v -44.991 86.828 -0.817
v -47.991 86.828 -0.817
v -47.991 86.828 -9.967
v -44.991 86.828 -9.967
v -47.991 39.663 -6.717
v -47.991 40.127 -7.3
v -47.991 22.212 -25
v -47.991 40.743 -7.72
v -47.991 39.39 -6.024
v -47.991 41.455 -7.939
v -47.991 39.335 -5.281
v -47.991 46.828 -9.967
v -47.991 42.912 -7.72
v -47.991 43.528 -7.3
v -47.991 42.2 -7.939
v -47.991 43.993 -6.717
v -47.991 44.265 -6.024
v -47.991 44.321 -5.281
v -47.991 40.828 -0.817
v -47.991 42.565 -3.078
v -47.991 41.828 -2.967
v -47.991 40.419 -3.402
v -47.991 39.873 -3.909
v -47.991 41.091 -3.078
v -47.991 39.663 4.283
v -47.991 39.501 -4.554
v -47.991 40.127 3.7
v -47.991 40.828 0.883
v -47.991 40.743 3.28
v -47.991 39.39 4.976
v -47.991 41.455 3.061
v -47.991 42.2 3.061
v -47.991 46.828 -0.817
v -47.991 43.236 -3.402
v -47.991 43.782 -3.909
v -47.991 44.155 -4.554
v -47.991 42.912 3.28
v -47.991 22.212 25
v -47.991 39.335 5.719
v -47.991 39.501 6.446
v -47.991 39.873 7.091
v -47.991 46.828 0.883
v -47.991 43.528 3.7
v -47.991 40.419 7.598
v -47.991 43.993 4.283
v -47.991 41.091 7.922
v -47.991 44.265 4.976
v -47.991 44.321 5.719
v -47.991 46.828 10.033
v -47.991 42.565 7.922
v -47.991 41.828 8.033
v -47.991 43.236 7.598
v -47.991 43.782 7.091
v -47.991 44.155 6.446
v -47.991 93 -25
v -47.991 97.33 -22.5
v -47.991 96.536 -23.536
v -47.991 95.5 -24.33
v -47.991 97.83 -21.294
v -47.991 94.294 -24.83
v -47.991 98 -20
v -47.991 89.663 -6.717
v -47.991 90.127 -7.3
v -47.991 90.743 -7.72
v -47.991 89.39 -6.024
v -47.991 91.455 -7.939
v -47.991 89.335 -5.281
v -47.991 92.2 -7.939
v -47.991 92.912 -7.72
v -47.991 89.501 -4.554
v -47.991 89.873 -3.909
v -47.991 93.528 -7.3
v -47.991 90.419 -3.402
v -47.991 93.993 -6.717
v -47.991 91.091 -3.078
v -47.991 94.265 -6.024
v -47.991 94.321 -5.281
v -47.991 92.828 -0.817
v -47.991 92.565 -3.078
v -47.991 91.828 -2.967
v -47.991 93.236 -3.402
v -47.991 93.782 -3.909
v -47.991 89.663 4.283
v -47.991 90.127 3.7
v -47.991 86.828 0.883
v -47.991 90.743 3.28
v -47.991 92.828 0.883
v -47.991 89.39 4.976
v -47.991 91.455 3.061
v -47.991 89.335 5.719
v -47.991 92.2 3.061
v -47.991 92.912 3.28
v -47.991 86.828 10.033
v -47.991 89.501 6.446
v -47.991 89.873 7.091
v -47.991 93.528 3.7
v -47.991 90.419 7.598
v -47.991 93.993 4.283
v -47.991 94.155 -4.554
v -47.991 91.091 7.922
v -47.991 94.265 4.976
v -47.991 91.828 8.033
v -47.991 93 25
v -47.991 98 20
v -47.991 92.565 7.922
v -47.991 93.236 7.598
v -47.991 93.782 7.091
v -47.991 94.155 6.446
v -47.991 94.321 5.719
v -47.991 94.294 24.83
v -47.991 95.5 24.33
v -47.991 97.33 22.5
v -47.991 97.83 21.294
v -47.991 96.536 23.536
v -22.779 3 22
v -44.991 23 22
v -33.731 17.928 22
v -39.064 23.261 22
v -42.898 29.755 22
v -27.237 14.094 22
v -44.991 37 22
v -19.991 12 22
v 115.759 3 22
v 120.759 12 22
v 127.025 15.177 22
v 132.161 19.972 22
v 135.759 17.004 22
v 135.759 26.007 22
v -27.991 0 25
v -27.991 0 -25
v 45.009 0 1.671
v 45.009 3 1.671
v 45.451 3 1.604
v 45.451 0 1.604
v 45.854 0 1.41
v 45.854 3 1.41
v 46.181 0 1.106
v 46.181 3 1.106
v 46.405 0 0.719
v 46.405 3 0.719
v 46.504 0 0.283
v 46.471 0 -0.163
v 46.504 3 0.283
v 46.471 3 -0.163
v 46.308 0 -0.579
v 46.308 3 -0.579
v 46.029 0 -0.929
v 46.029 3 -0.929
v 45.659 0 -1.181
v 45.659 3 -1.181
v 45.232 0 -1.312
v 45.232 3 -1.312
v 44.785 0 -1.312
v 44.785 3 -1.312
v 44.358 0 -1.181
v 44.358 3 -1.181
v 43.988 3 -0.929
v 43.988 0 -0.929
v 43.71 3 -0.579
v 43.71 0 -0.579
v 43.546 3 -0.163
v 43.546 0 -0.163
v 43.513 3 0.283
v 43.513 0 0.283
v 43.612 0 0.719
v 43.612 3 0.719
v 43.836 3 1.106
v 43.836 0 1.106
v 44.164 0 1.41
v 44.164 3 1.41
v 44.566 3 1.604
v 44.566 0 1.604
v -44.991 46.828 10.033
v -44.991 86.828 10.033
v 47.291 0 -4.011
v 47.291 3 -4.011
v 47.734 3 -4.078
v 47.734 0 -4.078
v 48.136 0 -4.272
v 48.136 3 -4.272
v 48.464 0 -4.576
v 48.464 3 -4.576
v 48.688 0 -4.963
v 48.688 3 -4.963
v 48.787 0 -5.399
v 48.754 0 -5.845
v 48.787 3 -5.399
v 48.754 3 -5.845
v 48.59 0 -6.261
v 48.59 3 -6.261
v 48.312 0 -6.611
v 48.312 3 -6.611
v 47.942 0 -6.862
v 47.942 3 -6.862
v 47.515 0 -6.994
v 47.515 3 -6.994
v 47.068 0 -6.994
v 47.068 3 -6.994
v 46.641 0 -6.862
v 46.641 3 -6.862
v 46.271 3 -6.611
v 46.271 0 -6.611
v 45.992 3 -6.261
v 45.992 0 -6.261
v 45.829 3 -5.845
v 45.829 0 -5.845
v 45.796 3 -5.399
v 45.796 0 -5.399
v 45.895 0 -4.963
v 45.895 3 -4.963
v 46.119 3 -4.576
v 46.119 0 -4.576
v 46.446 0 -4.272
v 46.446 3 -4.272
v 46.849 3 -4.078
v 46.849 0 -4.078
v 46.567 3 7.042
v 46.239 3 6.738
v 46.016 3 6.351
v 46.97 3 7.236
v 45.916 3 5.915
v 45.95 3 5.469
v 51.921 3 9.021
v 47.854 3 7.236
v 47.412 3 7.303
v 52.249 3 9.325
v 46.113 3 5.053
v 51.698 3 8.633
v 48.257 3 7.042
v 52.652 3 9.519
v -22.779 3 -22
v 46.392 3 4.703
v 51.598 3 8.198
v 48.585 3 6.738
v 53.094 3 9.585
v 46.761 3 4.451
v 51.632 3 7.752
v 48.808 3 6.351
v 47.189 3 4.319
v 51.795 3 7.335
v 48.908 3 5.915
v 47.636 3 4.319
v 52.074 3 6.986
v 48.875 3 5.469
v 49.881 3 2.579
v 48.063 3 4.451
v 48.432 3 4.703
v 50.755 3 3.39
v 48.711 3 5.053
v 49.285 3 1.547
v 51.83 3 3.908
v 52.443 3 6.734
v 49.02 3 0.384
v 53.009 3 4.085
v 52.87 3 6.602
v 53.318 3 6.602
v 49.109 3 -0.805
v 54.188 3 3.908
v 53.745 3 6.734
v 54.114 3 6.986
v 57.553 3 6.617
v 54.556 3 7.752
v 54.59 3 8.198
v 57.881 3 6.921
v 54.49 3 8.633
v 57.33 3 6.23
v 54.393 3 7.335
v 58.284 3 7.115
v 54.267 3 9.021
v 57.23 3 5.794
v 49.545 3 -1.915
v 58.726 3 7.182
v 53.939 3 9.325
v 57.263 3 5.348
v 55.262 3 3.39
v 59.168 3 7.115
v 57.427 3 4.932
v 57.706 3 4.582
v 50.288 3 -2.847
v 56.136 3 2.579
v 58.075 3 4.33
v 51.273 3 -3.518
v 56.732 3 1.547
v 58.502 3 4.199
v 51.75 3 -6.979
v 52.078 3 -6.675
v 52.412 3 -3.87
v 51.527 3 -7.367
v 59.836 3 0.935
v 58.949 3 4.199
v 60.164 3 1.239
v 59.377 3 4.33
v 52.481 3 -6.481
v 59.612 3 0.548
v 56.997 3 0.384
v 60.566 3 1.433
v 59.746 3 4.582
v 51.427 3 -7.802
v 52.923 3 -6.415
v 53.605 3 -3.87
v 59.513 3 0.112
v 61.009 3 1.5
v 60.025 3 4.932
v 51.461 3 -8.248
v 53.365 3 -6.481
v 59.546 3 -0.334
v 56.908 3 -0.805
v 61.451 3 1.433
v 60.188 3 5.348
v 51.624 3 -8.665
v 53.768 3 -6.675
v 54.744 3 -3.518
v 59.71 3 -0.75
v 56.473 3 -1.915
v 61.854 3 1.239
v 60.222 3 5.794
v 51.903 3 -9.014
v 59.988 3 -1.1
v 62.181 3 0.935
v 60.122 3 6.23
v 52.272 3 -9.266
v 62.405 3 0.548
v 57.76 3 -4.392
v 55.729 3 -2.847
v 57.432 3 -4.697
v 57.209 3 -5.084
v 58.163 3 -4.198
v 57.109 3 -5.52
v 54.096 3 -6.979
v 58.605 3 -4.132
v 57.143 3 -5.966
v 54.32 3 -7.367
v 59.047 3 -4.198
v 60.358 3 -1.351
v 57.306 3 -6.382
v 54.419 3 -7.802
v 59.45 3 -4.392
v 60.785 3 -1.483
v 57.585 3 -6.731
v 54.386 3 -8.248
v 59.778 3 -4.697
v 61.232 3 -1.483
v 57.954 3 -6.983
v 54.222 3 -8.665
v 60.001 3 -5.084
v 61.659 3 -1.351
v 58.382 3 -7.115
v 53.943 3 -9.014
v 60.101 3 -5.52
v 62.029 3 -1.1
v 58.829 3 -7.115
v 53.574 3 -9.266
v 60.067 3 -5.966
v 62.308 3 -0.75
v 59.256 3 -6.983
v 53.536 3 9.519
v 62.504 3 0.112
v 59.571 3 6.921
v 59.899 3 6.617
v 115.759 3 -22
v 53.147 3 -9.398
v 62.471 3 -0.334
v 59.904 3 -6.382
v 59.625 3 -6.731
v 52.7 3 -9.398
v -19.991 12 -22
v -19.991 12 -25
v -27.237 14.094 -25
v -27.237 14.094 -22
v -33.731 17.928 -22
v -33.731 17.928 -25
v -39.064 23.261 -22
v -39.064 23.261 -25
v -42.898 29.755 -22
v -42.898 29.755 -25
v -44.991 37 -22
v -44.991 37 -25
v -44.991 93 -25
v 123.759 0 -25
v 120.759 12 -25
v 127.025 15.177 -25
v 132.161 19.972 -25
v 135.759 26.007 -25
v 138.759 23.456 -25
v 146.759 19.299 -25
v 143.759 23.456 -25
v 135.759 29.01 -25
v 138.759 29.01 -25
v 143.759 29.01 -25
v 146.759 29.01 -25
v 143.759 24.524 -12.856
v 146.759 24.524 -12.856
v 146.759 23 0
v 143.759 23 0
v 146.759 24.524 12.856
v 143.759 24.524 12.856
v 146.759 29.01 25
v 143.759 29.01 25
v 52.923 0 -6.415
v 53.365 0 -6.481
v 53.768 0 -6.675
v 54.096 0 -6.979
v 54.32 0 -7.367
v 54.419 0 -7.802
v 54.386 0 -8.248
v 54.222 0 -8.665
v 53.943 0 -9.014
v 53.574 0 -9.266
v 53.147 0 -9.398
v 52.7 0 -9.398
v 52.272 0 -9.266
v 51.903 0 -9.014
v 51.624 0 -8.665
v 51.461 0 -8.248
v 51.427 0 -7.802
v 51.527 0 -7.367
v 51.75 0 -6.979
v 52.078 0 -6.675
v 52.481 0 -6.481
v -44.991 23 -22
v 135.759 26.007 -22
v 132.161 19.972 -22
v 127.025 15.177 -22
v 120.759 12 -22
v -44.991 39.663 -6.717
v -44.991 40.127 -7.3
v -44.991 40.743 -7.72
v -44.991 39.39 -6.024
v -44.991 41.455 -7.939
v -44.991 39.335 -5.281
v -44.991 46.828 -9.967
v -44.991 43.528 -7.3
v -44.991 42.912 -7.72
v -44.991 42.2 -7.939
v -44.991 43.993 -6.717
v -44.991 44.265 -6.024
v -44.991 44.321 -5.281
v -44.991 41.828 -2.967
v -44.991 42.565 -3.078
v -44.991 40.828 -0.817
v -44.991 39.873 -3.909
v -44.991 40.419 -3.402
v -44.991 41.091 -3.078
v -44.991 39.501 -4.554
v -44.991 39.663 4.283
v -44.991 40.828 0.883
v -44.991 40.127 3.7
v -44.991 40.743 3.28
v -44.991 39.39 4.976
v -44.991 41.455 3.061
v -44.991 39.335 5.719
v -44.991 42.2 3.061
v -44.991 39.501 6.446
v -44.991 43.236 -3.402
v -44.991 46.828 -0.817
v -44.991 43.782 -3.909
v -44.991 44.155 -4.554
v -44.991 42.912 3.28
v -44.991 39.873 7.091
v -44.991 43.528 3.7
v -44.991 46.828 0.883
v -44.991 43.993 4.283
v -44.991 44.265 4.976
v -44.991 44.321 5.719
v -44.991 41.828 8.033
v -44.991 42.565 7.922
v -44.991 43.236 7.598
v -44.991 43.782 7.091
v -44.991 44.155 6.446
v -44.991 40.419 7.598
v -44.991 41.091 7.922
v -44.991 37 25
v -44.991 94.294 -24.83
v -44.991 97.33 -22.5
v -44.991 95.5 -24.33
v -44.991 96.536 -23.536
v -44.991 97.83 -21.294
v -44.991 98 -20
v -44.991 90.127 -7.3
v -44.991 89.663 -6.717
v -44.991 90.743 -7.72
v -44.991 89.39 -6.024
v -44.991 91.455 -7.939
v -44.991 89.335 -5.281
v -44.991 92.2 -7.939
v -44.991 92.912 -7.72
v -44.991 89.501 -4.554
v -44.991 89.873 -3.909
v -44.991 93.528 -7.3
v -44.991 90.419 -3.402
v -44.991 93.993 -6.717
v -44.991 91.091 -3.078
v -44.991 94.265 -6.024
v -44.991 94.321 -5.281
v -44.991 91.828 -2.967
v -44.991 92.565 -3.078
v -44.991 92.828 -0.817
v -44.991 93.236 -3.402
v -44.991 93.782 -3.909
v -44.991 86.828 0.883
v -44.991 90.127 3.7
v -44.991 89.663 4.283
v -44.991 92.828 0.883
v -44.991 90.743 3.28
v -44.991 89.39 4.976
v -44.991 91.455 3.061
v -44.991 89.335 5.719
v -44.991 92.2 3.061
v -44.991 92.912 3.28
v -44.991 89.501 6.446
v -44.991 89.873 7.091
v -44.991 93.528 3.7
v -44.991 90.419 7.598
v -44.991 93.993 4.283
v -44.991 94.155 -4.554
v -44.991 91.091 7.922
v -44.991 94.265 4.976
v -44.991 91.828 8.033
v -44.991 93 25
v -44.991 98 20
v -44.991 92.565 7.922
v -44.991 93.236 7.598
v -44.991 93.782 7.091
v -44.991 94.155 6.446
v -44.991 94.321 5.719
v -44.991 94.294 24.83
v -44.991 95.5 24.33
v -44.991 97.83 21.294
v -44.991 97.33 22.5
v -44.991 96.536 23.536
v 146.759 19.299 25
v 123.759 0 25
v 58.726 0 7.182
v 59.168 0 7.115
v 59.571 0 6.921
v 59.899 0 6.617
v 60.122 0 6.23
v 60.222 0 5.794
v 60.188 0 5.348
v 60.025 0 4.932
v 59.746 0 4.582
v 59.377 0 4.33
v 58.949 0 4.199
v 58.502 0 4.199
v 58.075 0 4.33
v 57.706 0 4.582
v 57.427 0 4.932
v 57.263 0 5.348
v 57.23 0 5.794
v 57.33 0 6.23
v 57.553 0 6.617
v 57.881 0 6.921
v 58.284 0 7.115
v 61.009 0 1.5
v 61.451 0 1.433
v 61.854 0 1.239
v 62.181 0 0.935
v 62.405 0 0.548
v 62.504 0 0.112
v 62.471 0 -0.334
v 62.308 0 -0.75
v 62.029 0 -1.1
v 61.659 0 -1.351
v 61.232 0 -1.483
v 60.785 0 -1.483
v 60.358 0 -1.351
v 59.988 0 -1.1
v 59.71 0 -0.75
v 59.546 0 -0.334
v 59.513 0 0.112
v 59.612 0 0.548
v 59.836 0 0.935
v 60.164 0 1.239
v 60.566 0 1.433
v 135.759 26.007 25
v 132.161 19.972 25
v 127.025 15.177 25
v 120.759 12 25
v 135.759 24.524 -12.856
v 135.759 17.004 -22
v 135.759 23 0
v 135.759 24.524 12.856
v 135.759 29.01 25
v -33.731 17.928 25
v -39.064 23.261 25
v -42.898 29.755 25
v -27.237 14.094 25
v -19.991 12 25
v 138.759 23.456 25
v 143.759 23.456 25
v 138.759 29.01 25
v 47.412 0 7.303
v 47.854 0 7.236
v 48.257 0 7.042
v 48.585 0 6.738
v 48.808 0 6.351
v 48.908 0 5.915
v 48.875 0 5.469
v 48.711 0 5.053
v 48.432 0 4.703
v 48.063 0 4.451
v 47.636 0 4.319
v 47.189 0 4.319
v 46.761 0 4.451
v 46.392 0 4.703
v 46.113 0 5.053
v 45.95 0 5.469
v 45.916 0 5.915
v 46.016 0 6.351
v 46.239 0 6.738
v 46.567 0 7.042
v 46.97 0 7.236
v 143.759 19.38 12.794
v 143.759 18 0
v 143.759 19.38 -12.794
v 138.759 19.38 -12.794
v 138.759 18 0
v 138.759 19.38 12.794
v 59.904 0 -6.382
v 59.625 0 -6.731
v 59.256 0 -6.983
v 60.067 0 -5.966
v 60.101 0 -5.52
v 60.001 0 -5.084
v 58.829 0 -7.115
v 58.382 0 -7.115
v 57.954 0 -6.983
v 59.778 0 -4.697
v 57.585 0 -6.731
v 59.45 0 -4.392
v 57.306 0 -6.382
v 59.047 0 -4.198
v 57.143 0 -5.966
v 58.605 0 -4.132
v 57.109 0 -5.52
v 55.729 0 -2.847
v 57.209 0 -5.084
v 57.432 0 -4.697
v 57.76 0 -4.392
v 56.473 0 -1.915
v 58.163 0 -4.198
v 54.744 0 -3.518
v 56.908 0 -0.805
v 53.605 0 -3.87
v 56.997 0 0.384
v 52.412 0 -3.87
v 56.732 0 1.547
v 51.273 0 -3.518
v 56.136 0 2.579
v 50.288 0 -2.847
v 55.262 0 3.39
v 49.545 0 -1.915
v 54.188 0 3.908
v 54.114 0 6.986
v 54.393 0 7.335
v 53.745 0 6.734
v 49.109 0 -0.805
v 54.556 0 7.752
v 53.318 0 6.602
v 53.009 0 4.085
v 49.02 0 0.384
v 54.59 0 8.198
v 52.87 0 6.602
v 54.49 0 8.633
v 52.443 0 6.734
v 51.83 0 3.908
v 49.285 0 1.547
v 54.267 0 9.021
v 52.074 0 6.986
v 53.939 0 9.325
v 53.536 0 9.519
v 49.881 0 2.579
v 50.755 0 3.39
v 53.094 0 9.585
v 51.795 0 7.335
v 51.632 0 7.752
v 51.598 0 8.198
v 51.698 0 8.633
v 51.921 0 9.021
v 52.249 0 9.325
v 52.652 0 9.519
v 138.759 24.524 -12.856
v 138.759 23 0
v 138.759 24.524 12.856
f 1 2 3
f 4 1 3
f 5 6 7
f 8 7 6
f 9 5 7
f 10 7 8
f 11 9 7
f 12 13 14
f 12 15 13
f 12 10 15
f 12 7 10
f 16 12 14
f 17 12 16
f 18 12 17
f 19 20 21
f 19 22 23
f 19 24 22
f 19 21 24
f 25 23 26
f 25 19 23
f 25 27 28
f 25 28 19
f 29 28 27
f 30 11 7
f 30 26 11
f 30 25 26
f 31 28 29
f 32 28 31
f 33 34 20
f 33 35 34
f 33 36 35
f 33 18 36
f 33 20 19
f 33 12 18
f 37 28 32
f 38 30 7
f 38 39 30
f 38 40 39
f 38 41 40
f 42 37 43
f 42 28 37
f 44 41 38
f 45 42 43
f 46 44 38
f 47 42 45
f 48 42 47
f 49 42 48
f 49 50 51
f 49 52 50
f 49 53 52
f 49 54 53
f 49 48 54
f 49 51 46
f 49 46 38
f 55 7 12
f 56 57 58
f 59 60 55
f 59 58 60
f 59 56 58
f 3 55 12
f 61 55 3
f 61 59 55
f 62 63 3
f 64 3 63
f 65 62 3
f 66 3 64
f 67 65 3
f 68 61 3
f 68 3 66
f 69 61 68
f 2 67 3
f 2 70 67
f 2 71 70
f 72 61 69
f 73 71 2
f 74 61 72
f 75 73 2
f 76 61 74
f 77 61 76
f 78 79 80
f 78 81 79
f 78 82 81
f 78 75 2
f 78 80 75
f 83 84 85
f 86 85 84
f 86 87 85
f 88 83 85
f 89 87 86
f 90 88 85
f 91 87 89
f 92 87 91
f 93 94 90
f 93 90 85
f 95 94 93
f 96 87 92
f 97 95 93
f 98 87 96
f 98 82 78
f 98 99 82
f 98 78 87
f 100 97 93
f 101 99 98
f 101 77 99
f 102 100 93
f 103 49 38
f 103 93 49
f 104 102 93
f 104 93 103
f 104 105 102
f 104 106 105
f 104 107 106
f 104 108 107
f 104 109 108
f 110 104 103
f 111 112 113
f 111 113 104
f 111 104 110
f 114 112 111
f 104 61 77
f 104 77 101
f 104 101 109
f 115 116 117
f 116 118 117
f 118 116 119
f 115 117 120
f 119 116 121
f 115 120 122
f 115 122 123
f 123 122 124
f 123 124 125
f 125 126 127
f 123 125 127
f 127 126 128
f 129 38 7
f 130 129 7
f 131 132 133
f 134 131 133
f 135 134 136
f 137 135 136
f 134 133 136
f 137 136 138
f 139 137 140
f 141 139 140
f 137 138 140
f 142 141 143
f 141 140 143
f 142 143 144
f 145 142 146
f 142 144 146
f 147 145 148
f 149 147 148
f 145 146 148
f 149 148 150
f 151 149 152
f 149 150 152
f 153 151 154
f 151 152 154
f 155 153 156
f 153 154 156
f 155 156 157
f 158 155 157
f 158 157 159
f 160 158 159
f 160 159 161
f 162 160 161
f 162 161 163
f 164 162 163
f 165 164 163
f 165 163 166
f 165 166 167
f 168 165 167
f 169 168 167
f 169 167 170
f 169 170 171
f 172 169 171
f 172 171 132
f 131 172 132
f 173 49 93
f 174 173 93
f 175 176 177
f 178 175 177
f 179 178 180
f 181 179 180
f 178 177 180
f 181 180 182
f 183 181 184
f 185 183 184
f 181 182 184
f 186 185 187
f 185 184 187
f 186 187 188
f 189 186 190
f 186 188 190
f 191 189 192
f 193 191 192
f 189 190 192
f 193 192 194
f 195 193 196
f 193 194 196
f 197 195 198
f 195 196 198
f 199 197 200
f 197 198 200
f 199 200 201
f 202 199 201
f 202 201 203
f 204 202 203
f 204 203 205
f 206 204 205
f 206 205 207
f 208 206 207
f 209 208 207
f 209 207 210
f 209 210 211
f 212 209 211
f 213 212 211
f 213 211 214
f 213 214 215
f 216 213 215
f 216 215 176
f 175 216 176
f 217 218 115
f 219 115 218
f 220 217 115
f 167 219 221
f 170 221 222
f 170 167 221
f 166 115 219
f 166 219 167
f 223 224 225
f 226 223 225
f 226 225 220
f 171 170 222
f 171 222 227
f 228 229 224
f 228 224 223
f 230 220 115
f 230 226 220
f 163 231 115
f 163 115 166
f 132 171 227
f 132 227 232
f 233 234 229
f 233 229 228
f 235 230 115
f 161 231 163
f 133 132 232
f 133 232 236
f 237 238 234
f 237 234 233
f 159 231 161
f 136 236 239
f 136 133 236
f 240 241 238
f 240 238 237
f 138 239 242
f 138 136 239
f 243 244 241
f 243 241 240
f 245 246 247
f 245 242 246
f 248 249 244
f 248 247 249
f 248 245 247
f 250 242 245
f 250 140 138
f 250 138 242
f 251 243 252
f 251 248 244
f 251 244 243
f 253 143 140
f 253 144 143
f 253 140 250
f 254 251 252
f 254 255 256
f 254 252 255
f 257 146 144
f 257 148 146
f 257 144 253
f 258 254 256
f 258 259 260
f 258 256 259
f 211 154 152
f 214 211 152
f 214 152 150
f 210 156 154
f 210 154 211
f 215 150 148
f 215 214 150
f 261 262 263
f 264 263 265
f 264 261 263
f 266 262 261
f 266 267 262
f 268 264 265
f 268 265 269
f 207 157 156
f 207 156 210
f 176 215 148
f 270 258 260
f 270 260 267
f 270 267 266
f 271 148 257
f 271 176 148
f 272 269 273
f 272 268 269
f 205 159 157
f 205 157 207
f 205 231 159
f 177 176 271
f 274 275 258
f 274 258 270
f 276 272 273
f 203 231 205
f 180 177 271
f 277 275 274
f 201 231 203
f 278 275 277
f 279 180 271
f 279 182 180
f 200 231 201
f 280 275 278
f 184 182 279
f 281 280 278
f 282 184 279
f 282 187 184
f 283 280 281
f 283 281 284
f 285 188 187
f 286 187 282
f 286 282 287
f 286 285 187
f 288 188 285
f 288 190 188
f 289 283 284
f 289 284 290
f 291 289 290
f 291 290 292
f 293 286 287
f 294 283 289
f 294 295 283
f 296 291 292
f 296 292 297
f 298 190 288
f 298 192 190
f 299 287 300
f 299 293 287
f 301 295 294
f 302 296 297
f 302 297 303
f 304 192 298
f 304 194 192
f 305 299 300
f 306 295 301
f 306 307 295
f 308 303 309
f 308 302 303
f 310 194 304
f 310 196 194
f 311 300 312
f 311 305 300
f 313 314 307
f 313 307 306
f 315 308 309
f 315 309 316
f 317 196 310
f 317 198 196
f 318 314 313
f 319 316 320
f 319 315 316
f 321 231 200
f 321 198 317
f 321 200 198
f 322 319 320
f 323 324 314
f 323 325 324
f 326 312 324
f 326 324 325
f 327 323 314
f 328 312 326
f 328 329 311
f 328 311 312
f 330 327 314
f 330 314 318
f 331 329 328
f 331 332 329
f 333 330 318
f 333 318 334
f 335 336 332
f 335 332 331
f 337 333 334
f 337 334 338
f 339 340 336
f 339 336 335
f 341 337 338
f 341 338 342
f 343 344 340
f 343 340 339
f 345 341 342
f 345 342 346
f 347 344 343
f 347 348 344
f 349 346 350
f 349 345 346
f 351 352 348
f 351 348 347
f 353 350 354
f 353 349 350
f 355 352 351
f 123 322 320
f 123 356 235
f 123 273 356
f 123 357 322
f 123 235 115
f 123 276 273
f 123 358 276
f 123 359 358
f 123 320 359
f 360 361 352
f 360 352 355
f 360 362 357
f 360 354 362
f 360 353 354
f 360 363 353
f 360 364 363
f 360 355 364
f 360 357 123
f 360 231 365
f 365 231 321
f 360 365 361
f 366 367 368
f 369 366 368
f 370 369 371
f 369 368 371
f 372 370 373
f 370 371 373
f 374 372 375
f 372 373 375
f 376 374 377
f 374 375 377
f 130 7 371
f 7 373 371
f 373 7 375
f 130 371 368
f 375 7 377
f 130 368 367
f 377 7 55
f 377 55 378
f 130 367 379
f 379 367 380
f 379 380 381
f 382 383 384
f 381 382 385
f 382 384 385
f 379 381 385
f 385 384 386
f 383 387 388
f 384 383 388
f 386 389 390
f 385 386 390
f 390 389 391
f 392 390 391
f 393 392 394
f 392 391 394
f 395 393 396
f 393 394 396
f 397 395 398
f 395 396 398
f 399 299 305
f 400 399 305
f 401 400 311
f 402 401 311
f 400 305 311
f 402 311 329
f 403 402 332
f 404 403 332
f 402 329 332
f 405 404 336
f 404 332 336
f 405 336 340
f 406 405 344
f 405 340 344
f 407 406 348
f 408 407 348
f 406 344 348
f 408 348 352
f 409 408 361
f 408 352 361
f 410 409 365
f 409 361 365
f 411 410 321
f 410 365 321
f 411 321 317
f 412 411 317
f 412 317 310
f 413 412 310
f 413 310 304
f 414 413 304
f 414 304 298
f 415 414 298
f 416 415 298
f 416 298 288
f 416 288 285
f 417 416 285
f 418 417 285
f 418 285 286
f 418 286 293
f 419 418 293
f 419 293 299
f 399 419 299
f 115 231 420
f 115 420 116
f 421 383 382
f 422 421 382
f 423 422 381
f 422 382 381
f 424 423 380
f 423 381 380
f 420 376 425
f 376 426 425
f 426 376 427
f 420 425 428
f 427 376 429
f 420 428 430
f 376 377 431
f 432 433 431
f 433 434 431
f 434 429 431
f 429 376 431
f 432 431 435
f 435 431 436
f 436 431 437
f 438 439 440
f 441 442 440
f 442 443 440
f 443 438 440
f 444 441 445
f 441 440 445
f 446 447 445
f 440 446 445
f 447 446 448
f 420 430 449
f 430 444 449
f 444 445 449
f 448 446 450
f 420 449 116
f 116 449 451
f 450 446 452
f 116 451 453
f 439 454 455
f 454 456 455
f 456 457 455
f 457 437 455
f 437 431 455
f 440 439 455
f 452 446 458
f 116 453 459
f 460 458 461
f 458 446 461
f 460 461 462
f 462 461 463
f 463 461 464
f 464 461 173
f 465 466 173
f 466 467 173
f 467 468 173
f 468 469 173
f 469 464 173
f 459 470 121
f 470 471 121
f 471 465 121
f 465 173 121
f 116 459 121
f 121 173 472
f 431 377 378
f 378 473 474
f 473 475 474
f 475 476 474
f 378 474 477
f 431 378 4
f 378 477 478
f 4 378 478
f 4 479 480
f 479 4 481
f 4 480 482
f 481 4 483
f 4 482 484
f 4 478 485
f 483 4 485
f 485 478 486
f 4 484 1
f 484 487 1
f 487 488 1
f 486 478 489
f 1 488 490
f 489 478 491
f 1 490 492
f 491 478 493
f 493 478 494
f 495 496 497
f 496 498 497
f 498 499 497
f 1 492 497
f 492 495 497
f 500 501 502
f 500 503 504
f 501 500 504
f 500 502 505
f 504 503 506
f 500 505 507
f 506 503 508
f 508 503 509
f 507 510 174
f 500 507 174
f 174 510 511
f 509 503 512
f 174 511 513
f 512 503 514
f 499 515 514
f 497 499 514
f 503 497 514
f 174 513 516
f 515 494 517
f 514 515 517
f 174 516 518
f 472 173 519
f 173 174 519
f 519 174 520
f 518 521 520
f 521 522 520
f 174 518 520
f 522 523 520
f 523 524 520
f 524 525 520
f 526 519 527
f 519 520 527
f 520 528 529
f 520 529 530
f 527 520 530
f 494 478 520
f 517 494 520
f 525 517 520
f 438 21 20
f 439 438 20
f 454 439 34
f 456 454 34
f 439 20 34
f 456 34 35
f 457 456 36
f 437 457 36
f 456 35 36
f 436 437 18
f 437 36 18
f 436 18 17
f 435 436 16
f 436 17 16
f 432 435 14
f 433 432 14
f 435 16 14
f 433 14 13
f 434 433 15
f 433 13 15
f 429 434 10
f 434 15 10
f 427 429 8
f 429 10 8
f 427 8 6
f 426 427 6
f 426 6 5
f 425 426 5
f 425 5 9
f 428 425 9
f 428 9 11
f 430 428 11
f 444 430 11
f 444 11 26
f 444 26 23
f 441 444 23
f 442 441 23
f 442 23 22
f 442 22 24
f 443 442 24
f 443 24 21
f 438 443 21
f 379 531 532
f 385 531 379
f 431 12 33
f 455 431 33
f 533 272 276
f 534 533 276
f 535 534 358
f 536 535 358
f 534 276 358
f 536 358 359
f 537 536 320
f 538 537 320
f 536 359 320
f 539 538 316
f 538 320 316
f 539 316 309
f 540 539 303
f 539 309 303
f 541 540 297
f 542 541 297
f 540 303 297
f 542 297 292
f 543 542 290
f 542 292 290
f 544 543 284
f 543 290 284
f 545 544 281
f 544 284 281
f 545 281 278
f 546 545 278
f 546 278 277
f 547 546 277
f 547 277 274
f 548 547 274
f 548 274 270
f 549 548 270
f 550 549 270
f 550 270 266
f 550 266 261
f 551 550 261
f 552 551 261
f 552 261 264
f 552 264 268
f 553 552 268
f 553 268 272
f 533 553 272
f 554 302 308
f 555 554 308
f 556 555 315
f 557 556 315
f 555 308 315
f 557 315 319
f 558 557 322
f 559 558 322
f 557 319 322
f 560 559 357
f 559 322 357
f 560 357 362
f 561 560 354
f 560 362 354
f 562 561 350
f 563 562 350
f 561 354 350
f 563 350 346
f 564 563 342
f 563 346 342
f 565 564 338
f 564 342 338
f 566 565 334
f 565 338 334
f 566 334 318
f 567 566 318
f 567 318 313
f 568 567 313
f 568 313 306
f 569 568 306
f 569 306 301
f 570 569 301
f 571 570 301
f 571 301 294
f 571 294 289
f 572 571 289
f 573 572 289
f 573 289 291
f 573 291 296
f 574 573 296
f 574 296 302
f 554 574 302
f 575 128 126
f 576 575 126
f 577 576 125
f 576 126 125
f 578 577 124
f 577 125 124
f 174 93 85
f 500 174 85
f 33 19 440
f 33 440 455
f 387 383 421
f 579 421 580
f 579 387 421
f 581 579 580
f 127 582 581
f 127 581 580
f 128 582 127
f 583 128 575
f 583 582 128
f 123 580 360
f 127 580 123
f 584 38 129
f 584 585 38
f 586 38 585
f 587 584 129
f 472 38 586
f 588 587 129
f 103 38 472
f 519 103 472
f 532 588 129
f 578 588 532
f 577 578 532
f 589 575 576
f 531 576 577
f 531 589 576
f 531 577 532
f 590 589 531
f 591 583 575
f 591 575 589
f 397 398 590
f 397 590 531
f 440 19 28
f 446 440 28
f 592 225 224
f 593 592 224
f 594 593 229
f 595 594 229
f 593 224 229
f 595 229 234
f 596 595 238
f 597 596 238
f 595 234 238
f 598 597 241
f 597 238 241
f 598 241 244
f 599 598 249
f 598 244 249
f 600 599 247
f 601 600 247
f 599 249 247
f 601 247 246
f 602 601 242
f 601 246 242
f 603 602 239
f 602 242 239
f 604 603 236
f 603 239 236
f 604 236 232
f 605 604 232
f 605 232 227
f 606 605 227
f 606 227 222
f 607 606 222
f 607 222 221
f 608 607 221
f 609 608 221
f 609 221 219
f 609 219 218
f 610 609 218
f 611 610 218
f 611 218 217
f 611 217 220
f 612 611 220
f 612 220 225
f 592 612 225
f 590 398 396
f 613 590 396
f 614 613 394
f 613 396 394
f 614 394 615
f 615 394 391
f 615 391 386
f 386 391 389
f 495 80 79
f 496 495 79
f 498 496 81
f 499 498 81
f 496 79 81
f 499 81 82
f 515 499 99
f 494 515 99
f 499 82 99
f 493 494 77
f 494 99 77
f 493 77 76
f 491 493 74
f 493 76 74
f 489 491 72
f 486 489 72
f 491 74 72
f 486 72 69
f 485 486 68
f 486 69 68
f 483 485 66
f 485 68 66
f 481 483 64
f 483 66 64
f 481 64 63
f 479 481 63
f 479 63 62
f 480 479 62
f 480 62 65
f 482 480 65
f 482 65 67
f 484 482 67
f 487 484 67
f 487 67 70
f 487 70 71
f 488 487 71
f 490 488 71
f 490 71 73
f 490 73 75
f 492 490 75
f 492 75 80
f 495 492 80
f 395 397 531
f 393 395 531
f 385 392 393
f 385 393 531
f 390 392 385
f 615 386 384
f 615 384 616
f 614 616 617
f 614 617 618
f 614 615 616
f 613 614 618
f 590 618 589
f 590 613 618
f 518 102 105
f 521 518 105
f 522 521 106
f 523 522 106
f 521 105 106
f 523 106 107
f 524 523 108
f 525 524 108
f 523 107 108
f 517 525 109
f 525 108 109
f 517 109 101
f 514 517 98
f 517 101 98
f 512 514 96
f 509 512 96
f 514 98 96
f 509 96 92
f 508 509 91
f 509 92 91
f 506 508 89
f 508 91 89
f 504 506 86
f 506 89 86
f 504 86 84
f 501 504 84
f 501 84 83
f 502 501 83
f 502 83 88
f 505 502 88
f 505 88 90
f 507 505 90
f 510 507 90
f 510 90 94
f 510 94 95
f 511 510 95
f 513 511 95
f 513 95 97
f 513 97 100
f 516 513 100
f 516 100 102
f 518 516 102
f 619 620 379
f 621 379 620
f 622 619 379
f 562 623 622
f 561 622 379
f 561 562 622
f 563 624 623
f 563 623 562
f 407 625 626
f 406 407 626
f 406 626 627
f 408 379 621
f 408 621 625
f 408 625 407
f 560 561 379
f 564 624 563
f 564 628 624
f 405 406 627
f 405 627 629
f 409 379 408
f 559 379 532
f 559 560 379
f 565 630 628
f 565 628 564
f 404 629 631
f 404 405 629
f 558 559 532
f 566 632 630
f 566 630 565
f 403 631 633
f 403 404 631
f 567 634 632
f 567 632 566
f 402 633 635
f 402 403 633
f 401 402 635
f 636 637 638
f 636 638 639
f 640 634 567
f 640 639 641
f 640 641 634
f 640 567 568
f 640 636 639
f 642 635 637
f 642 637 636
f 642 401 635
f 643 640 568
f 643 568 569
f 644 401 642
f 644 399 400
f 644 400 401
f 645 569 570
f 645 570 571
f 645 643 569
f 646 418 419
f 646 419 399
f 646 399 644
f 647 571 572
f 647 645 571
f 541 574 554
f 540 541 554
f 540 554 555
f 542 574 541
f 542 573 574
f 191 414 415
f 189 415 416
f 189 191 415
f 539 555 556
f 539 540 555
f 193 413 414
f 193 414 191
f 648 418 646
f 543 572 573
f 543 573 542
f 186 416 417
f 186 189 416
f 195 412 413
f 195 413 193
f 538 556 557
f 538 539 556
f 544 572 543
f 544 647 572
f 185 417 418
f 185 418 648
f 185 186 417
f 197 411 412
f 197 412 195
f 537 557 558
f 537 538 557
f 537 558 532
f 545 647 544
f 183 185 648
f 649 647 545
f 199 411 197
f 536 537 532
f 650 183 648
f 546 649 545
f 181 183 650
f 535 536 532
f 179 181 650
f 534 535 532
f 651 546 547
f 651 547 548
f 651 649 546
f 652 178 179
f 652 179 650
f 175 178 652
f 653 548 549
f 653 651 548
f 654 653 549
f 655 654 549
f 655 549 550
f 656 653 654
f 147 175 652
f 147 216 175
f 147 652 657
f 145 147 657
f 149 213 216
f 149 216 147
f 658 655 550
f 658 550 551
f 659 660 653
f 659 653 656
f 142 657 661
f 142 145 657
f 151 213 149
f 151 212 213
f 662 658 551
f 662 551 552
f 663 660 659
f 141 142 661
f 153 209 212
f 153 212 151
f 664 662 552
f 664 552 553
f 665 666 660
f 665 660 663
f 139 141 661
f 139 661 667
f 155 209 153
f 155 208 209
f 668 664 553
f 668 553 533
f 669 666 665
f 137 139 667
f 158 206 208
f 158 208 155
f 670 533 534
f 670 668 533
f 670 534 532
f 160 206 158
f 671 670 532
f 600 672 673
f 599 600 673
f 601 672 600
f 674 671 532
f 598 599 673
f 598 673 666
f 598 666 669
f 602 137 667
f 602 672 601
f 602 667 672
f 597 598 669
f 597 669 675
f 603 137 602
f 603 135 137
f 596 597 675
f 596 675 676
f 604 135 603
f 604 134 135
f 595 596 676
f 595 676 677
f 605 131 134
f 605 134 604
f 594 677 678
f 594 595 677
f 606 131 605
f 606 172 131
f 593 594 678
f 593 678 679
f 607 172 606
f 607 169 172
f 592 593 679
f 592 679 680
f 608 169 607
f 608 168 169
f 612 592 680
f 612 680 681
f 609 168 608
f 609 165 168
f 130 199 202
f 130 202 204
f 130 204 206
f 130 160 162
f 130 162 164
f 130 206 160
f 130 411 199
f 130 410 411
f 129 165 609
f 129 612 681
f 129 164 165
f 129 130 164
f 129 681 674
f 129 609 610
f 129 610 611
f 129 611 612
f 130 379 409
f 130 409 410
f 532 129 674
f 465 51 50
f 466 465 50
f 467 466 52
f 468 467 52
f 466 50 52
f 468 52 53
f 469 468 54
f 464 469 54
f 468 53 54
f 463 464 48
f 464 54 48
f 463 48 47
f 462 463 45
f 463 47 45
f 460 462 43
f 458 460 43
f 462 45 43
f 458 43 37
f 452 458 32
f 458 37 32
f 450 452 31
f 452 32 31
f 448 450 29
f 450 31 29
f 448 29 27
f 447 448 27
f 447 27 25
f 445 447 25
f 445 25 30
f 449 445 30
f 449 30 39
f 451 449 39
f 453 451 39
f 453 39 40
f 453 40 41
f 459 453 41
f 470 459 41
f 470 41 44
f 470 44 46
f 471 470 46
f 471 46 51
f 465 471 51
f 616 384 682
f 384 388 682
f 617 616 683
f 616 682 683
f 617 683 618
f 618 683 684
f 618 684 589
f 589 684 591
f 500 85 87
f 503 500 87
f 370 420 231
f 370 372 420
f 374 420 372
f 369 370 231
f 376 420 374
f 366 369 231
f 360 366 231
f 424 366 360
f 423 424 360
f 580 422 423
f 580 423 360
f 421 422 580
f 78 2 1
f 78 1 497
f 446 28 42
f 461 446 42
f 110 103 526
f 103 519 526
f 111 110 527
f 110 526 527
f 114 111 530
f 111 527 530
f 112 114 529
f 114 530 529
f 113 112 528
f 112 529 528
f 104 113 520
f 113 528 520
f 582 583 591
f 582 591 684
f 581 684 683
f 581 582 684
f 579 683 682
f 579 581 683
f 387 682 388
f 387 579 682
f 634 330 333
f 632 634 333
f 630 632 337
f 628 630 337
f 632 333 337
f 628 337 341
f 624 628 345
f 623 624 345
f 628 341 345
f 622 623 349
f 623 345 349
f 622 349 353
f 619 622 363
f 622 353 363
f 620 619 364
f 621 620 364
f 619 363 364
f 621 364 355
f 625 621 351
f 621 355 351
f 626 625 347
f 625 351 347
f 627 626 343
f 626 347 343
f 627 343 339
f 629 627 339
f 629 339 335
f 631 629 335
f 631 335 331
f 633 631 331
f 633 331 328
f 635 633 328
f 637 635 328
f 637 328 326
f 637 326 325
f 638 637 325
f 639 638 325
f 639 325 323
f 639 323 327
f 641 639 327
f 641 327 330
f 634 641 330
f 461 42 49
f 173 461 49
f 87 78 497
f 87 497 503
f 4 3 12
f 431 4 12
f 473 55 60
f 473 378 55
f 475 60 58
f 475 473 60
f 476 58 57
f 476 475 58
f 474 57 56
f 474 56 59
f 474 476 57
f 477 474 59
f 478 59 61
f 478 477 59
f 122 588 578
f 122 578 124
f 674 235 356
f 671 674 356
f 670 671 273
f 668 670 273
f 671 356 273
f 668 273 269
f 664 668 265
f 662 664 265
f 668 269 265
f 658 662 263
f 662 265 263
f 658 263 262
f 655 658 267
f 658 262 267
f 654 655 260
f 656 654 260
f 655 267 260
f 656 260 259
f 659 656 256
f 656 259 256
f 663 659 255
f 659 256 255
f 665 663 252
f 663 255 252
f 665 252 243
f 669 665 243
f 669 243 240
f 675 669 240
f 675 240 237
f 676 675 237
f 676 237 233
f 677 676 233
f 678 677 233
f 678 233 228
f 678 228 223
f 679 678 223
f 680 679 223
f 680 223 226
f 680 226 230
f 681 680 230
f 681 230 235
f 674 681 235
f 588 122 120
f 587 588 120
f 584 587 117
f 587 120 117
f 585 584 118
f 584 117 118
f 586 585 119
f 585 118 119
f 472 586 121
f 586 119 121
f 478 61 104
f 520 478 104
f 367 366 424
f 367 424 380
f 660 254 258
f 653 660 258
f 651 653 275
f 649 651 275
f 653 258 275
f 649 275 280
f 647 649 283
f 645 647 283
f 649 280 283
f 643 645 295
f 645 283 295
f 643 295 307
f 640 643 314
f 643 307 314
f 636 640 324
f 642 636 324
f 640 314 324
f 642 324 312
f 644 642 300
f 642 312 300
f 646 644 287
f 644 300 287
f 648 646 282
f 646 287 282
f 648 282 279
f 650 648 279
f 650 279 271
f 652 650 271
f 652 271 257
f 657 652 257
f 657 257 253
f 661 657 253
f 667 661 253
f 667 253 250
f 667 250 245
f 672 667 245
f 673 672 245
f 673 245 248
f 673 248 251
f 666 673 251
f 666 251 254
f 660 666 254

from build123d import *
from OCP.BRepFilletAPI import BRepFilletAPI_MakeChamfer

# Parameters (mm, degrees)
SKETCH1_W           = 194.75
SKETCH1_H           = 50
BOSS_EXTRUDE1_DEPTH = 3
BOSS_EXTRUDE2_START = -3
BOSS_EXTRUDE2_DEPTH = 5
BOSS_EXTRUDE3_DEPTH = 3
BOSS_EXTRUDE4_START = -3
BOSS_EXTRUDE4_DEPTH = 3
SKETCH6_W           = 50
SKETCH6_H           = 95
BOSS_EXTRUDE5_DEPTH = 3
BOSS_EXTRUDE6_REACH = 218.788
SKETCH7_W           = 3
SKETCH7_H           = 9
RIB1_START          = -3
RIB1_DEPTH          = 3
LPATTERN1_COUNT     = 2
LPATTERN1_PITCH     = 47
RIB2_START          = -3
RIB2_DEPTH          = 3
LPATTERN2_COUNT     = 2
LPATTERN2_PITCH     = 47
CUT_EXTRUDE1_REACH  = 178.602
SKETCH10_R          = 4
SKETCH10_R_2        = 1.5
FILLET1_R           = 5
CHAMFER1_SIZE       = 20
CHAMFER1_SIZE2      = 22.212250297
CHAMFER2_SIZE       = 20
CHAMFER2_SIZE2      = 14.004150764
CHAMFER3_SIZE       = 23
CHAMFER3_SIZE2      = 19.299291517
CUT_EXTRUDE2_REACH  = 221.446
SKETCH11_W          = 1.7
SKETCH11_H          = 6
SKETCH11_R          = 2.5


# Read off the part's stored shape, not the designer's step: Rib1, Rib2
with BuildPart() as part:
    # Sketch1 → Boss-Extrude1 (new body)
    with BuildSketch(Plane(origin=(0, 0, 0), x_dir=(1, 0, 0), z_dir=(0, 1, 0))):
        with Locations((49.3836315, 0)):
            Rectangle(SKETCH1_W, SKETCH1_H)
    extrude(amount=BOSS_EXTRUDE1_DEPTH)

    # Sketch2 → Boss-Extrude2 (add)
    with BuildSketch(Plane(origin=(146.7586315, 0, 0), x_dir=(0, 0, -1), z_dir=(1, 0, 0)).offset(BOSS_EXTRUDE2_START)):
        with BuildLine():
            Line((25, 3), (25, 23.456439427))
            ThreePointArc((25, 23.456439427), (0, 18), (-25, 23.456439427))
            Line((-25, 23.456439427), (-25, 3))
            Line((-25, 3), (25, 3))
        make_face()
    extrude(amount=-BOSS_EXTRUDE2_DEPTH)

    # Sketch3 → Boss-Extrude3 (add)
    with BuildSketch(Plane(origin=(143.7586315, 0, 0), x_dir=(0, 0, -1), z_dir=(1, 0, 0))):
        with BuildLine():
            Line((-25, 3), (25, 3))
            Line((25, 3), (25, 29.010205144))
            ThreePointArc((25, 29.010205144), (0, 23), (-25, 29.010205144))
            Line((-25, 29.010205144), (-25, 3))
        make_face()
    extrude(amount=BOSS_EXTRUDE3_DEPTH)

    # Sketch4 → Boss-Extrude4 (add)
    with BuildSketch(Plane(origin=(138.7586315, 0, 0), x_dir=(0, 0, -1), z_dir=(1, 0, 0)).offset(BOSS_EXTRUDE4_START)):
        with BuildLine():
            Line((-25, 0), (-25, 29.010205144))
            ThreePointArc((-25, 29.010205144), (0, 23), (25, 29.010205144))
            Line((25, 29.010205144), (25, 0))
            Line((25, 0), (-25, 0))
        make_face()
    extrude(amount=BOSS_EXTRUDE4_DEPTH)

    # Sketch6 → Boss-Extrude5 (add)
    with BuildSketch(Plane.ZY.offset(47.9913685)):
        with Locations((0, 50.5)):
            Rectangle(SKETCH6_W, SKETCH6_H)
    extrude(amount=-BOSS_EXTRUDE5_DEPTH)

    # Sketch7 → Boss-Extrude6 (add, up to next)
    with BuildSketch(Plane(origin=(-44.9913685, 0, 0), x_dir=(0, 0, -1), z_dir=(1, 0, 0)), mode=Mode.PRIVATE) as boss_extrude6_sk1:
        with Locations((-23.5, 7.5)):
            Rectangle(SKETCH7_W, SKETCH7_H)
    boss_extrude6_tool1 = extrude(boss_extrude6_sk1.sketch, amount=BOSS_EXTRUDE6_REACH, mode=Mode.PRIVATE) - part.part
    # Sketch7 → Boss-Extrude6 (add, up to next)
    with BuildSketch(Plane(origin=(-44.9913685, 0, 0), x_dir=(0, 0, -1), z_dir=(1, 0, 0)), mode=Mode.PRIVATE) as boss_extrude6_sk2:
        with Locations((23.5, 7.5)):
            Rectangle(SKETCH7_W, SKETCH7_H)
    boss_extrude6_tool2 = extrude(boss_extrude6_sk2.sketch, amount=BOSS_EXTRUDE6_REACH, mode=Mode.PRIVATE) - part.part
    add(boss_extrude6_tool1.solids().sort_by_distance((-44.991369, 7.5, 23.5))[0])
    add(boss_extrude6_tool2.solids().sort_by_distance((-44.991369, 7.5, -23.5))[0])

    # Rib1 outline → Rib1 (add)
    with BuildSketch(Plane.XY.offset(25).offset(RIB1_START)):
        with BuildLine():
            ThreePointArc((-19.991368497, 11.999999999), (-36.565435434, 20.425933064), (-44.9913685, 37))
            Line((-44.9913685, 37), (-44.9913685, 12))
            Line((-44.9913685, 12), (-19.991368497, 11.999999999))
        make_face()
    rib1 = extrude(amount=RIB1_DEPTH)

    # LPattern1: Rib1 ×2
    with Locations(*[(0, 0, -i * LPATTERN1_PITCH) for i in range(1, LPATTERN1_COUNT)]):
        add(rib1)

    # Rib2 outline → Rib2 (add)
    with BuildSketch(Plane.XY.offset(25).offset(RIB2_START)):
        with BuildLine():
            ThreePointArc((135.7586315, 26.007069295), (129.762224626, 17.393355072), (120.7586315, 12))
            Line((120.7586315, 12), (135.7586315, 12))
            Line((135.7586315, 12), (135.7586315, 26.007069295))
        make_face()
    rib2 = extrude(amount=RIB2_DEPTH)

    # LPattern2: Rib2 ×2
    with Locations(*[(0, 0, -i * LPATTERN2_PITCH) for i in range(1, LPATTERN2_COUNT)]):
        add(rib2)

    # Sketch10 → Cut-Extrude1 (cut, up to next)
    with BuildSketch(Plane(origin=(0, 3, 0), x_dir=(1, 0, 0), z_dir=(0, 1, 0)), mode=Mode.PRIVATE) as cut_extrude1_sk1:
        with Locations(Location((53.0086315, -0.085435095, 0), (0, 0, 270))):
            Circle(SKETCH10_R)
    cut_extrude1_tool1 = extrude(cut_extrude1_sk1.sketch, amount=-CUT_EXTRUDE1_REACH, mode=Mode.PRIVATE) & part.part
    # Sketch10 → Cut-Extrude1 (cut, up to next)
    with BuildSketch(Plane(origin=(0, 3, 0), x_dir=(1, 0, 0), z_dir=(0, 1, 0)), mode=Mode.PRIVATE) as cut_extrude1_sk2:
        with Locations(Location((61.0086315, -2.1452e-05, 0), (0, 0, 270))):
            Circle(SKETCH10_R_2)
    cut_extrude1_tool2 = extrude(cut_extrude1_sk2.sketch, amount=-CUT_EXTRUDE1_REACH, mode=Mode.PRIVATE) & part.part
    # Sketch10 → Cut-Extrude1 (cut, up to next)
    with BuildSketch(Plane(origin=(0, 3, 0), x_dir=(1, 0, 0), z_dir=(0, 1, 0)), mode=Mode.PRIVATE) as cut_extrude1_sk3:
        with Locations(Location((58.725882315, -5.681892778, 0), (0, 0, 270))):
            Circle(SKETCH10_R_2)
    cut_extrude1_tool3 = extrude(cut_extrude1_sk3.sketch, amount=-CUT_EXTRUDE1_REACH, mode=Mode.PRIVATE) & part.part
    # Sketch10 → Cut-Extrude1 (cut, up to next)
    with BuildSketch(Plane(origin=(0, 3, 0), x_dir=(1, 0, 0), z_dir=(0, 1, 0)), mode=Mode.PRIVATE) as cut_extrude1_sk4:
        with Locations(Location((53.094045142, -8.085435095, 0), (0, 0, 270))):
            Circle(SKETCH10_R_2)
    cut_extrude1_tool4 = extrude(cut_extrude1_sk4.sketch, amount=-CUT_EXTRUDE1_REACH, mode=Mode.PRIVATE) & part.part
    # Sketch10 → Cut-Extrude1 (cut, up to next)
    with BuildSketch(Plane(origin=(0, 3, 0), x_dir=(1, 0, 0), z_dir=(0, 1, 0)), mode=Mode.PRIVATE) as cut_extrude1_sk5:
        with Locations(Location((47.412173816, -5.80268591, 0), (0, 0, 270))):
            Circle(SKETCH10_R_2)
    cut_extrude1_tool5 = extrude(cut_extrude1_sk5.sketch, amount=-CUT_EXTRUDE1_REACH, mode=Mode.PRIVATE) & part.part
    # Sketch10 → Cut-Extrude1 (cut, up to next)
    with BuildSketch(Plane(origin=(0, 3, 0), x_dir=(1, 0, 0), z_dir=(0, 1, 0)), mode=Mode.PRIVATE) as cut_extrude1_sk6:
        with Locations(Location((45.0086315, -0.170848737, 0), (0, 0, 270))):
            Circle(SKETCH10_R_2)
    cut_extrude1_tool6 = extrude(cut_extrude1_sk6.sketch, amount=-CUT_EXTRUDE1_REACH, mode=Mode.PRIVATE) & part.part
    # Sketch10 → Cut-Extrude1 (cut, up to next)
    with BuildSketch(Plane(origin=(0, 3, 0), x_dir=(1, 0, 0), z_dir=(0, 1, 0)), mode=Mode.PRIVATE) as cut_extrude1_sk7:
        with Locations(Location((47.291380684, 5.511022589, 0), (0, 0, 270))):
            Circle(SKETCH10_R_2)
    cut_extrude1_tool7 = extrude(cut_extrude1_sk7.sketch, amount=-CUT_EXTRUDE1_REACH, mode=Mode.PRIVATE) & part.part
    # Sketch10 → Cut-Extrude1 (cut, up to next)
    with BuildSketch(Plane(origin=(0, 3, 0), x_dir=(1, 0, 0), z_dir=(0, 1, 0)), mode=Mode.PRIVATE) as cut_extrude1_sk8:
        with Locations(Location((52.923217857, 7.914564905, 0), (0, 0, 270))):
            Circle(SKETCH10_R_2)
    cut_extrude1_tool8 = extrude(cut_extrude1_sk8.sketch, amount=-CUT_EXTRUDE1_REACH, mode=Mode.PRIVATE) & part.part
    # Sketch10 → Cut-Extrude1 (cut, up to next)
    with BuildSketch(Plane(origin=(0, 3, 0), x_dir=(1, 0, 0), z_dir=(0, 1, 0)), mode=Mode.PRIVATE) as cut_extrude1_sk9:
        with Locations(Location((58.605089183, 5.631815721, 0), (0, 0, 270))):
            Circle(SKETCH10_R_2)
    cut_extrude1_tool9 = extrude(cut_extrude1_sk9.sketch, amount=-CUT_EXTRUDE1_REACH, mode=Mode.PRIVATE) & part.part
    add(cut_extrude1_tool1.solids().sort_by_distance((53.008631, 3, 0.085435))[0], mode=Mode.SUBTRACT)
    add(cut_extrude1_tool2.solids().sort_by_distance((61.008631, 3, 2.1e-05))[0], mode=Mode.SUBTRACT)
    add(cut_extrude1_tool3.solids().sort_by_distance((58.725882, 3, 5.681893))[0], mode=Mode.SUBTRACT)
    add(cut_extrude1_tool4.solids().sort_by_distance((53.094045, 3, 8.085435))[0], mode=Mode.SUBTRACT)
    add(cut_extrude1_tool5.solids().sort_by_distance((47.412174, 3, 5.802686))[0], mode=Mode.SUBTRACT)
    add(cut_extrude1_tool6.solids().sort_by_distance((45.008631, 3, 0.170849))[0], mode=Mode.SUBTRACT)
    add(cut_extrude1_tool7.solids().sort_by_distance((47.291381, 3, -5.511023))[0], mode=Mode.SUBTRACT)
    add(cut_extrude1_tool8.solids().sort_by_distance((52.923218, 3, -7.914565))[0], mode=Mode.SUBTRACT)
    add(cut_extrude1_tool9.solids().sort_by_distance((58.605089, 3, -5.631816))[0], mode=Mode.SUBTRACT)

    # Fillet1
    fillet1_edges = [part.edges().sort_by_distance(p)[0] for p in [
        (-46.4913685, 98, 25),
        (-46.4913685, 98, -25),
    ]]
    fillet(fillet1_edges, radius=FILLET1_R)

    # Chamfer1: one chamfer whose edges measure the first distance from different faces: ONE call of the kernel's chamfer builder (chamfer() names one face for all edges)
    chamfer1_edges_1 = [part.edges().sort_by_distance(p)[0] for p in [
        (-47.9913685, 0, 0),
    ]]
    chamfer1_side_1 = [part.faces().sort_by_distance(p)[0] for p in [
        (-45.98070785, 0, 0),
    ]]
    chamfer1_edges_2 = [part.edges().sort_by_distance(p)[0] for p in [
        (-44.9913685, 3, 0),
    ]]
    chamfer1_side_2 = [part.faces().sort_by_distance(p)[0] for p in [
        (-44.9913685, 51.76217503, 0),
    ]]
    chamfer1 = BRepFilletAPI_MakeChamfer(part.part.solid().wrapped)
    for e in chamfer1_edges_1:
        chamfer1.Add(CHAMFER1_SIZE, CHAMFER1_SIZE2, e.wrapped, chamfer1_side_1[0].wrapped)  # the first distance lies on this face
    for e in chamfer1_edges_2:
        chamfer1.Add(CHAMFER1_SIZE, CHAMFER1_SIZE2, e.wrapped, chamfer1_side_2[0].wrapped)  # the first distance lies on this face
    add(Compound.cast(chamfer1.Shape()), mode=Mode.REPLACE)

    # Chamfer2
    chamfer2_edges = [part.edges().sort_by_distance(p)[0] for p in [
        (135.7586315, 3, 0),
    ]]
    chamfer2_side = [part.faces().sort_by_distance(p)[0] for p in [
        (56.489756648, 3, -20.354697047),
    ]]
    chamfer(chamfer2_edges, length=CHAMFER2_SIZE, length2=CHAMFER2_SIZE2, reference=chamfer2_side[0])

    # Chamfer3
    chamfer3_edges = [part.edges().sort_by_distance(p)[0] for p in [
        (146.7586315, 0, 0),
    ]]
    chamfer3_side = [part.faces().sort_by_distance(p)[0] for p in [
        (59.462529077, 0, -0.001057352),
    ]]
    chamfer(chamfer3_edges, length=CHAMFER3_SIZE, length2=CHAMFER3_SIZE2, reference=chamfer3_side[0])

    # Sketch11 → Cut-Extrude2 (cut, up to next)
    with BuildSketch(Plane.ZY.offset(47.9913685), mode=Mode.PRIVATE) as cut_extrude2_sk1:
        with Locations((0.032606221, 89.827764741)):
            Rectangle(SKETCH11_W, SKETCH11_H)
    cut_extrude2_tool1 = extrude(cut_extrude2_sk1.sketch, amount=-CUT_EXTRUDE2_REACH, mode=Mode.PRIVATE) & part.part
    # Sketch11 → Cut-Extrude2 (cut, up to next)
    with BuildSketch(Plane.ZY.offset(47.9913685), mode=Mode.PRIVATE) as cut_extrude2_sk2:
        Polygon((0.882606221, 86.827764741), (-0.817393779, 86.827764741), (-9.967393779, 86.827764741), (-9.967393779, 46.827764741), (-0.817393779, 46.827764741), (0.882606221, 46.827764741), (10.032606221, 46.827764741), (10.032606221, 86.827764741), align=None)
    cut_extrude2_tool2 = extrude(cut_extrude2_sk2.sketch, amount=-CUT_EXTRUDE2_REACH, mode=Mode.PRIVATE) & part.part
    # Sketch11 → Cut-Extrude2 (cut, up to next)
    with BuildSketch(Plane.ZY.offset(47.9913685), mode=Mode.PRIVATE) as cut_extrude2_sk3:
        with Locations((-5.467393779, 91.827764741)):
            Circle(SKETCH11_R)
    cut_extrude2_tool3 = extrude(cut_extrude2_sk3.sketch, amount=-CUT_EXTRUDE2_REACH, mode=Mode.PRIVATE) & part.part
    # Sketch11 → Cut-Extrude2 (cut, up to next)
    with BuildSketch(Plane.ZY.offset(47.9913685), mode=Mode.PRIVATE) as cut_extrude2_sk4:
        with Locations((5.532606221, 91.827764741)):
            Circle(SKETCH11_R)
    cut_extrude2_tool4 = extrude(cut_extrude2_sk4.sketch, amount=-CUT_EXTRUDE2_REACH, mode=Mode.PRIVATE) & part.part
    # Sketch11 → Cut-Extrude2 (cut, up to next)
    with BuildSketch(Plane.ZY.offset(47.9913685), mode=Mode.PRIVATE) as cut_extrude2_sk5:
        with Locations((0.032606221, 43.827764741)):
            Rectangle(SKETCH11_W, SKETCH11_H)
    cut_extrude2_tool5 = extrude(cut_extrude2_sk5.sketch, amount=-CUT_EXTRUDE2_REACH, mode=Mode.PRIVATE) & part.part
    # Sketch11 → Cut-Extrude2 (cut, up to next)
    with BuildSketch(Plane.ZY.offset(47.9913685), mode=Mode.PRIVATE) as cut_extrude2_sk6:
        with Locations((-5.467393779, 41.827764741)):
            Circle(SKETCH11_R)
    cut_extrude2_tool6 = extrude(cut_extrude2_sk6.sketch, amount=-CUT_EXTRUDE2_REACH, mode=Mode.PRIVATE) & part.part
    # Sketch11 → Cut-Extrude2 (cut, up to next)
    with BuildSketch(Plane.ZY.offset(47.9913685), mode=Mode.PRIVATE) as cut_extrude2_sk7:
        with Locations((5.532606221, 41.827764741)):
            Circle(SKETCH11_R)
    cut_extrude2_tool7 = extrude(cut_extrude2_sk7.sketch, amount=-CUT_EXTRUDE2_REACH, mode=Mode.PRIVATE) & part.part
    add(cut_extrude2_tool1.solids().sort_by_distance((-47.991369, 89.827765, 0.032606))[0], mode=Mode.SUBTRACT)
    add(cut_extrude2_tool2.solids().sort_by_distance((-47.991369, 66.827765, 0.032606))[0], mode=Mode.SUBTRACT)
    add(cut_extrude2_tool3.solids().sort_by_distance((-47.991369, 91.827765, -5.467394))[0], mode=Mode.SUBTRACT)
    add(cut_extrude2_tool4.solids().sort_by_distance((-47.991369, 91.827765, 5.532606))[0], mode=Mode.SUBTRACT)
    add(cut_extrude2_tool5.solids().sort_by_distance((-47.991369, 43.827765, 0.032606))[0], mode=Mode.SUBTRACT)
    add(cut_extrude2_tool6.solids().sort_by_distance((-47.991369, 41.827765, -5.467394))[0], mode=Mode.SUBTRACT)
    add(cut_extrude2_tool7.solids().sort_by_distance((-47.991369, 41.827765, 5.532606))[0], mode=Mode.SUBTRACT)


solid = part.part
